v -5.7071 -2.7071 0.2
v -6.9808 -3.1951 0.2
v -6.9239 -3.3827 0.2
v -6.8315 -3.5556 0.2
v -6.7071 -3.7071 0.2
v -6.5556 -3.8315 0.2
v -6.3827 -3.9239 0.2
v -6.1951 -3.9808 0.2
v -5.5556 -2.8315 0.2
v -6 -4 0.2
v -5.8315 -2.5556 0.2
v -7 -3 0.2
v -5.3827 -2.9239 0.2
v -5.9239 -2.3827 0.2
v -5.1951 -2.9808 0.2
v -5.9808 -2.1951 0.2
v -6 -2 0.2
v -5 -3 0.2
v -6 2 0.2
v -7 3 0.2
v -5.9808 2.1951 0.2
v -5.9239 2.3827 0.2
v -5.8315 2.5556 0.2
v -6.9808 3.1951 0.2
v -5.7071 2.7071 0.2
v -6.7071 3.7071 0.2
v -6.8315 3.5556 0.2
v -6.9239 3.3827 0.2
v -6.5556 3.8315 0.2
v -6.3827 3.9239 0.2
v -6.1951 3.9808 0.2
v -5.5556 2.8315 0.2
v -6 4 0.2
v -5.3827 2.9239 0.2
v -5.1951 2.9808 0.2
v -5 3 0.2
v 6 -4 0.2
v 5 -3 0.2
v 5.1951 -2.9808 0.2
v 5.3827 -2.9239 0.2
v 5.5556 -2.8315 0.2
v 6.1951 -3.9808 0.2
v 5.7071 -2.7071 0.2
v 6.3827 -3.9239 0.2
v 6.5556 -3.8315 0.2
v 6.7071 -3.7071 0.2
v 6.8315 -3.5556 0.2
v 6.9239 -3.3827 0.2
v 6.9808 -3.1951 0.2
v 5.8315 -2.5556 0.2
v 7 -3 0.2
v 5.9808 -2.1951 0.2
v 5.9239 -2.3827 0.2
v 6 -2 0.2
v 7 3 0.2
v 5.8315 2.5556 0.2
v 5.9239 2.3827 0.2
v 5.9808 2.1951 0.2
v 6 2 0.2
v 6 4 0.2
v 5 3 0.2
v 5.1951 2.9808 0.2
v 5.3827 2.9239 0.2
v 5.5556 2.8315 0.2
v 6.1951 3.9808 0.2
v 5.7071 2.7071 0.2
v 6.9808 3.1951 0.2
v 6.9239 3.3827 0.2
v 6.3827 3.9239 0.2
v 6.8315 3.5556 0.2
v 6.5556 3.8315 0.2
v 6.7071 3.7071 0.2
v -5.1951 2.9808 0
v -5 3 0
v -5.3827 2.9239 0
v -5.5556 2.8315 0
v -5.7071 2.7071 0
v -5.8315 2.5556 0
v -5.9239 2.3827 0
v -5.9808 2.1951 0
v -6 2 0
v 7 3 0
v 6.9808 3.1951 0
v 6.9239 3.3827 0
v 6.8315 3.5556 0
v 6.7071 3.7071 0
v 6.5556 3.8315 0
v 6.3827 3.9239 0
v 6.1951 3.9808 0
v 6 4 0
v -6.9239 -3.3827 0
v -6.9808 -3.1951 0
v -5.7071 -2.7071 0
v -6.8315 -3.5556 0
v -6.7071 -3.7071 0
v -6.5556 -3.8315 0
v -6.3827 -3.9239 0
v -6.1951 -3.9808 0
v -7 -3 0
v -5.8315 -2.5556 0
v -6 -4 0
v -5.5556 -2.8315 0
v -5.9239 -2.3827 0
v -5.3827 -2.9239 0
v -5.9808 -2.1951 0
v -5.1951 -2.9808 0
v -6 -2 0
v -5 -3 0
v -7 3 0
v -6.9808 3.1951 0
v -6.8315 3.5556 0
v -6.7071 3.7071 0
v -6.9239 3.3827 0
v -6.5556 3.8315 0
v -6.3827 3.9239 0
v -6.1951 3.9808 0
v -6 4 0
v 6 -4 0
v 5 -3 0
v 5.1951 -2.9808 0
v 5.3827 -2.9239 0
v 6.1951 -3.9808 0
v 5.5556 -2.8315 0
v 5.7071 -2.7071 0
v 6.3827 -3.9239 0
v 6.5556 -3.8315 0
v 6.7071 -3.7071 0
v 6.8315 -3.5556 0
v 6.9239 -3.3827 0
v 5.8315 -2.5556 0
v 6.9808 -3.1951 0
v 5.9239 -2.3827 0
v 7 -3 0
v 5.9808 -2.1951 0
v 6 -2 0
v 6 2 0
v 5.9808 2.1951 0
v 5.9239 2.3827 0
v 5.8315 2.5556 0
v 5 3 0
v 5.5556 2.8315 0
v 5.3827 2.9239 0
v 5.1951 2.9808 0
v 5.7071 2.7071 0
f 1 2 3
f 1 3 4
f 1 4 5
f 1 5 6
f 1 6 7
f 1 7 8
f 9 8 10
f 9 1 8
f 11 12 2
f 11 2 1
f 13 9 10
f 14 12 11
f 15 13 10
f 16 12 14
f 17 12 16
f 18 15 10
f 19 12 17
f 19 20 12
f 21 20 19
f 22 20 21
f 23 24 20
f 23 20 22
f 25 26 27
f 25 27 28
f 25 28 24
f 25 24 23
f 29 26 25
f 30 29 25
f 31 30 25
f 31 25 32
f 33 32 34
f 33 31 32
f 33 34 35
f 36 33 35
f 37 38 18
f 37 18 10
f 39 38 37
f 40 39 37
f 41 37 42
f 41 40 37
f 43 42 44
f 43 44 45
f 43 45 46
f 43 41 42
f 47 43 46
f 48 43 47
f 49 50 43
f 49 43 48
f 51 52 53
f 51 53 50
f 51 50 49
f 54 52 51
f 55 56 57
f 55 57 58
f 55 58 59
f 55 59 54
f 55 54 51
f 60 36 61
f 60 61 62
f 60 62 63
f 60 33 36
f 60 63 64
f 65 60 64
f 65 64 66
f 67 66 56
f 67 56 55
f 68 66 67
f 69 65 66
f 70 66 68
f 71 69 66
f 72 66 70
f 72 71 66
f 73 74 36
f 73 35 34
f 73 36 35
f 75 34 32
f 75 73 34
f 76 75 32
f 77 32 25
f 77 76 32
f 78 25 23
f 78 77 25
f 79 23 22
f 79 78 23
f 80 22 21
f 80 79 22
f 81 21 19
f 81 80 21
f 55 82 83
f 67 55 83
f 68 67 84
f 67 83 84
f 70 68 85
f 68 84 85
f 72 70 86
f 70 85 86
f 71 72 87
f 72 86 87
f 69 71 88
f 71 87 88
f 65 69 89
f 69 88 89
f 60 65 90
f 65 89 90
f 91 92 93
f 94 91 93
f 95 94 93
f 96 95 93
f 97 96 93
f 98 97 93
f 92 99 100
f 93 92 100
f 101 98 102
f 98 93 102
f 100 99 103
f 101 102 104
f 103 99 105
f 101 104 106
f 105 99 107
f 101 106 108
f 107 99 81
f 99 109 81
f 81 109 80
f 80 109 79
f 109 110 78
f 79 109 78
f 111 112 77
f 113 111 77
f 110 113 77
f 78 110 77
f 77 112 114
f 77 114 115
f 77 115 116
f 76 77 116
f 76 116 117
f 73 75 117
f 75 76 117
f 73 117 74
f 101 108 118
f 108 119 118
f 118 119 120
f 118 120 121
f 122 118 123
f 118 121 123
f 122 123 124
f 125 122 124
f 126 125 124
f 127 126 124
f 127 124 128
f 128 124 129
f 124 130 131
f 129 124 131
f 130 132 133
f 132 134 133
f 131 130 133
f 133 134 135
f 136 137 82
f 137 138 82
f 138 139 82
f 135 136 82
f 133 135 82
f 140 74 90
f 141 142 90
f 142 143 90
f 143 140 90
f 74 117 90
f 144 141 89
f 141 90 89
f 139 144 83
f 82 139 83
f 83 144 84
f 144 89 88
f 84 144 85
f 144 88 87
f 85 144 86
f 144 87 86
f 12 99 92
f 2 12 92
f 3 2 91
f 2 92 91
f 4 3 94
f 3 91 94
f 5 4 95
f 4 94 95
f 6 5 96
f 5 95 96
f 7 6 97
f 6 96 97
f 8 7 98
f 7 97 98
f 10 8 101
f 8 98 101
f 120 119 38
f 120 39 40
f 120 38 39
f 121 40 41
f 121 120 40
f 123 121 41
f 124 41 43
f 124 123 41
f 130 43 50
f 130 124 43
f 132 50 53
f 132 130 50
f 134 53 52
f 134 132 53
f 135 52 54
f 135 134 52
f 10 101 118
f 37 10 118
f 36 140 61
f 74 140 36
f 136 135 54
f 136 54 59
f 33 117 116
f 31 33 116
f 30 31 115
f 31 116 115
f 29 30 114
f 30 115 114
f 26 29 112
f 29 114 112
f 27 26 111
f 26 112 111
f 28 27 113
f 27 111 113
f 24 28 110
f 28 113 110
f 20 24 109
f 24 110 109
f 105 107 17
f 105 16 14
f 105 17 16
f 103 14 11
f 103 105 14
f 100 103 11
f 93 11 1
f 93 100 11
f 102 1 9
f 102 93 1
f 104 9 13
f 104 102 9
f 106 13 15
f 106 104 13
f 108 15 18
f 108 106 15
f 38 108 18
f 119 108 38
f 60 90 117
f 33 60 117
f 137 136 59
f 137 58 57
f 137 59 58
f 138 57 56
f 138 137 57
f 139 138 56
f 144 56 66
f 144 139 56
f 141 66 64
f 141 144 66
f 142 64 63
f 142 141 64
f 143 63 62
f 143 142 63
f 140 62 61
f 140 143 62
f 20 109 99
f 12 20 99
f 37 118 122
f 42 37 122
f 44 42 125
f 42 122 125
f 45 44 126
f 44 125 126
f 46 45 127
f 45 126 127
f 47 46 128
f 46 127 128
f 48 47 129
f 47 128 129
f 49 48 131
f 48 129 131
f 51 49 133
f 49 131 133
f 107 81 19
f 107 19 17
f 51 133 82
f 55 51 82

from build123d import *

# Parameters (mm, degrees)
F2_DEPTH = 0.2
F3_DEPTH = 1


with BuildPart() as f2:
    # F0 (on Top) → F2 (new body)
    with BuildSketch(Plane.XY):
        with BuildLine():
            ThreePointArc((7, 3), (6.707107, 3.707107), (6, 4))
            Line((6, 4), (-6, 4))
            ThreePointArc((-6, 4), (-6.707107, 3.707107), (-7, 3))
            Line((-7, 3), (-7, -3))
            ThreePointArc((-7, -3), (-6.707107, -3.707107), (-6, -4))
            Line((-6, -4), (6, -4))
            ThreePointArc((6, -4), (6.707107, -3.707107), (7, -3))
            Line((7, -3), (7, 3))
        make_face()
    extrude(amount=F2_DEPTH)

    # F1 (on face) → F3 (cut)
    with BuildSketch(Plane.XY):
        with BuildLine():
            Line((5, 3), (-5, 3))
            ThreePointArc((-5, 3), (-5.707107, 2.707107), (-6, 2))
            Line((-6, 2), (-6, -2))
            ThreePointArc((-6, -2), (-5.707107, -2.707107), (-5, -3))
            Line((-5, -3), (5, -3))
            ThreePointArc((5, -3), (5.707107, -2.707107), (6, -2))
            Line((6, -2), (6, 2))
            ThreePointArc((6, 2), (5.707107, 2.707107), (5, 3))
        make_face()
    extrude(amount=F3_DEPTH, mode=Mode.SUBTRACT)


solid = f2.part
